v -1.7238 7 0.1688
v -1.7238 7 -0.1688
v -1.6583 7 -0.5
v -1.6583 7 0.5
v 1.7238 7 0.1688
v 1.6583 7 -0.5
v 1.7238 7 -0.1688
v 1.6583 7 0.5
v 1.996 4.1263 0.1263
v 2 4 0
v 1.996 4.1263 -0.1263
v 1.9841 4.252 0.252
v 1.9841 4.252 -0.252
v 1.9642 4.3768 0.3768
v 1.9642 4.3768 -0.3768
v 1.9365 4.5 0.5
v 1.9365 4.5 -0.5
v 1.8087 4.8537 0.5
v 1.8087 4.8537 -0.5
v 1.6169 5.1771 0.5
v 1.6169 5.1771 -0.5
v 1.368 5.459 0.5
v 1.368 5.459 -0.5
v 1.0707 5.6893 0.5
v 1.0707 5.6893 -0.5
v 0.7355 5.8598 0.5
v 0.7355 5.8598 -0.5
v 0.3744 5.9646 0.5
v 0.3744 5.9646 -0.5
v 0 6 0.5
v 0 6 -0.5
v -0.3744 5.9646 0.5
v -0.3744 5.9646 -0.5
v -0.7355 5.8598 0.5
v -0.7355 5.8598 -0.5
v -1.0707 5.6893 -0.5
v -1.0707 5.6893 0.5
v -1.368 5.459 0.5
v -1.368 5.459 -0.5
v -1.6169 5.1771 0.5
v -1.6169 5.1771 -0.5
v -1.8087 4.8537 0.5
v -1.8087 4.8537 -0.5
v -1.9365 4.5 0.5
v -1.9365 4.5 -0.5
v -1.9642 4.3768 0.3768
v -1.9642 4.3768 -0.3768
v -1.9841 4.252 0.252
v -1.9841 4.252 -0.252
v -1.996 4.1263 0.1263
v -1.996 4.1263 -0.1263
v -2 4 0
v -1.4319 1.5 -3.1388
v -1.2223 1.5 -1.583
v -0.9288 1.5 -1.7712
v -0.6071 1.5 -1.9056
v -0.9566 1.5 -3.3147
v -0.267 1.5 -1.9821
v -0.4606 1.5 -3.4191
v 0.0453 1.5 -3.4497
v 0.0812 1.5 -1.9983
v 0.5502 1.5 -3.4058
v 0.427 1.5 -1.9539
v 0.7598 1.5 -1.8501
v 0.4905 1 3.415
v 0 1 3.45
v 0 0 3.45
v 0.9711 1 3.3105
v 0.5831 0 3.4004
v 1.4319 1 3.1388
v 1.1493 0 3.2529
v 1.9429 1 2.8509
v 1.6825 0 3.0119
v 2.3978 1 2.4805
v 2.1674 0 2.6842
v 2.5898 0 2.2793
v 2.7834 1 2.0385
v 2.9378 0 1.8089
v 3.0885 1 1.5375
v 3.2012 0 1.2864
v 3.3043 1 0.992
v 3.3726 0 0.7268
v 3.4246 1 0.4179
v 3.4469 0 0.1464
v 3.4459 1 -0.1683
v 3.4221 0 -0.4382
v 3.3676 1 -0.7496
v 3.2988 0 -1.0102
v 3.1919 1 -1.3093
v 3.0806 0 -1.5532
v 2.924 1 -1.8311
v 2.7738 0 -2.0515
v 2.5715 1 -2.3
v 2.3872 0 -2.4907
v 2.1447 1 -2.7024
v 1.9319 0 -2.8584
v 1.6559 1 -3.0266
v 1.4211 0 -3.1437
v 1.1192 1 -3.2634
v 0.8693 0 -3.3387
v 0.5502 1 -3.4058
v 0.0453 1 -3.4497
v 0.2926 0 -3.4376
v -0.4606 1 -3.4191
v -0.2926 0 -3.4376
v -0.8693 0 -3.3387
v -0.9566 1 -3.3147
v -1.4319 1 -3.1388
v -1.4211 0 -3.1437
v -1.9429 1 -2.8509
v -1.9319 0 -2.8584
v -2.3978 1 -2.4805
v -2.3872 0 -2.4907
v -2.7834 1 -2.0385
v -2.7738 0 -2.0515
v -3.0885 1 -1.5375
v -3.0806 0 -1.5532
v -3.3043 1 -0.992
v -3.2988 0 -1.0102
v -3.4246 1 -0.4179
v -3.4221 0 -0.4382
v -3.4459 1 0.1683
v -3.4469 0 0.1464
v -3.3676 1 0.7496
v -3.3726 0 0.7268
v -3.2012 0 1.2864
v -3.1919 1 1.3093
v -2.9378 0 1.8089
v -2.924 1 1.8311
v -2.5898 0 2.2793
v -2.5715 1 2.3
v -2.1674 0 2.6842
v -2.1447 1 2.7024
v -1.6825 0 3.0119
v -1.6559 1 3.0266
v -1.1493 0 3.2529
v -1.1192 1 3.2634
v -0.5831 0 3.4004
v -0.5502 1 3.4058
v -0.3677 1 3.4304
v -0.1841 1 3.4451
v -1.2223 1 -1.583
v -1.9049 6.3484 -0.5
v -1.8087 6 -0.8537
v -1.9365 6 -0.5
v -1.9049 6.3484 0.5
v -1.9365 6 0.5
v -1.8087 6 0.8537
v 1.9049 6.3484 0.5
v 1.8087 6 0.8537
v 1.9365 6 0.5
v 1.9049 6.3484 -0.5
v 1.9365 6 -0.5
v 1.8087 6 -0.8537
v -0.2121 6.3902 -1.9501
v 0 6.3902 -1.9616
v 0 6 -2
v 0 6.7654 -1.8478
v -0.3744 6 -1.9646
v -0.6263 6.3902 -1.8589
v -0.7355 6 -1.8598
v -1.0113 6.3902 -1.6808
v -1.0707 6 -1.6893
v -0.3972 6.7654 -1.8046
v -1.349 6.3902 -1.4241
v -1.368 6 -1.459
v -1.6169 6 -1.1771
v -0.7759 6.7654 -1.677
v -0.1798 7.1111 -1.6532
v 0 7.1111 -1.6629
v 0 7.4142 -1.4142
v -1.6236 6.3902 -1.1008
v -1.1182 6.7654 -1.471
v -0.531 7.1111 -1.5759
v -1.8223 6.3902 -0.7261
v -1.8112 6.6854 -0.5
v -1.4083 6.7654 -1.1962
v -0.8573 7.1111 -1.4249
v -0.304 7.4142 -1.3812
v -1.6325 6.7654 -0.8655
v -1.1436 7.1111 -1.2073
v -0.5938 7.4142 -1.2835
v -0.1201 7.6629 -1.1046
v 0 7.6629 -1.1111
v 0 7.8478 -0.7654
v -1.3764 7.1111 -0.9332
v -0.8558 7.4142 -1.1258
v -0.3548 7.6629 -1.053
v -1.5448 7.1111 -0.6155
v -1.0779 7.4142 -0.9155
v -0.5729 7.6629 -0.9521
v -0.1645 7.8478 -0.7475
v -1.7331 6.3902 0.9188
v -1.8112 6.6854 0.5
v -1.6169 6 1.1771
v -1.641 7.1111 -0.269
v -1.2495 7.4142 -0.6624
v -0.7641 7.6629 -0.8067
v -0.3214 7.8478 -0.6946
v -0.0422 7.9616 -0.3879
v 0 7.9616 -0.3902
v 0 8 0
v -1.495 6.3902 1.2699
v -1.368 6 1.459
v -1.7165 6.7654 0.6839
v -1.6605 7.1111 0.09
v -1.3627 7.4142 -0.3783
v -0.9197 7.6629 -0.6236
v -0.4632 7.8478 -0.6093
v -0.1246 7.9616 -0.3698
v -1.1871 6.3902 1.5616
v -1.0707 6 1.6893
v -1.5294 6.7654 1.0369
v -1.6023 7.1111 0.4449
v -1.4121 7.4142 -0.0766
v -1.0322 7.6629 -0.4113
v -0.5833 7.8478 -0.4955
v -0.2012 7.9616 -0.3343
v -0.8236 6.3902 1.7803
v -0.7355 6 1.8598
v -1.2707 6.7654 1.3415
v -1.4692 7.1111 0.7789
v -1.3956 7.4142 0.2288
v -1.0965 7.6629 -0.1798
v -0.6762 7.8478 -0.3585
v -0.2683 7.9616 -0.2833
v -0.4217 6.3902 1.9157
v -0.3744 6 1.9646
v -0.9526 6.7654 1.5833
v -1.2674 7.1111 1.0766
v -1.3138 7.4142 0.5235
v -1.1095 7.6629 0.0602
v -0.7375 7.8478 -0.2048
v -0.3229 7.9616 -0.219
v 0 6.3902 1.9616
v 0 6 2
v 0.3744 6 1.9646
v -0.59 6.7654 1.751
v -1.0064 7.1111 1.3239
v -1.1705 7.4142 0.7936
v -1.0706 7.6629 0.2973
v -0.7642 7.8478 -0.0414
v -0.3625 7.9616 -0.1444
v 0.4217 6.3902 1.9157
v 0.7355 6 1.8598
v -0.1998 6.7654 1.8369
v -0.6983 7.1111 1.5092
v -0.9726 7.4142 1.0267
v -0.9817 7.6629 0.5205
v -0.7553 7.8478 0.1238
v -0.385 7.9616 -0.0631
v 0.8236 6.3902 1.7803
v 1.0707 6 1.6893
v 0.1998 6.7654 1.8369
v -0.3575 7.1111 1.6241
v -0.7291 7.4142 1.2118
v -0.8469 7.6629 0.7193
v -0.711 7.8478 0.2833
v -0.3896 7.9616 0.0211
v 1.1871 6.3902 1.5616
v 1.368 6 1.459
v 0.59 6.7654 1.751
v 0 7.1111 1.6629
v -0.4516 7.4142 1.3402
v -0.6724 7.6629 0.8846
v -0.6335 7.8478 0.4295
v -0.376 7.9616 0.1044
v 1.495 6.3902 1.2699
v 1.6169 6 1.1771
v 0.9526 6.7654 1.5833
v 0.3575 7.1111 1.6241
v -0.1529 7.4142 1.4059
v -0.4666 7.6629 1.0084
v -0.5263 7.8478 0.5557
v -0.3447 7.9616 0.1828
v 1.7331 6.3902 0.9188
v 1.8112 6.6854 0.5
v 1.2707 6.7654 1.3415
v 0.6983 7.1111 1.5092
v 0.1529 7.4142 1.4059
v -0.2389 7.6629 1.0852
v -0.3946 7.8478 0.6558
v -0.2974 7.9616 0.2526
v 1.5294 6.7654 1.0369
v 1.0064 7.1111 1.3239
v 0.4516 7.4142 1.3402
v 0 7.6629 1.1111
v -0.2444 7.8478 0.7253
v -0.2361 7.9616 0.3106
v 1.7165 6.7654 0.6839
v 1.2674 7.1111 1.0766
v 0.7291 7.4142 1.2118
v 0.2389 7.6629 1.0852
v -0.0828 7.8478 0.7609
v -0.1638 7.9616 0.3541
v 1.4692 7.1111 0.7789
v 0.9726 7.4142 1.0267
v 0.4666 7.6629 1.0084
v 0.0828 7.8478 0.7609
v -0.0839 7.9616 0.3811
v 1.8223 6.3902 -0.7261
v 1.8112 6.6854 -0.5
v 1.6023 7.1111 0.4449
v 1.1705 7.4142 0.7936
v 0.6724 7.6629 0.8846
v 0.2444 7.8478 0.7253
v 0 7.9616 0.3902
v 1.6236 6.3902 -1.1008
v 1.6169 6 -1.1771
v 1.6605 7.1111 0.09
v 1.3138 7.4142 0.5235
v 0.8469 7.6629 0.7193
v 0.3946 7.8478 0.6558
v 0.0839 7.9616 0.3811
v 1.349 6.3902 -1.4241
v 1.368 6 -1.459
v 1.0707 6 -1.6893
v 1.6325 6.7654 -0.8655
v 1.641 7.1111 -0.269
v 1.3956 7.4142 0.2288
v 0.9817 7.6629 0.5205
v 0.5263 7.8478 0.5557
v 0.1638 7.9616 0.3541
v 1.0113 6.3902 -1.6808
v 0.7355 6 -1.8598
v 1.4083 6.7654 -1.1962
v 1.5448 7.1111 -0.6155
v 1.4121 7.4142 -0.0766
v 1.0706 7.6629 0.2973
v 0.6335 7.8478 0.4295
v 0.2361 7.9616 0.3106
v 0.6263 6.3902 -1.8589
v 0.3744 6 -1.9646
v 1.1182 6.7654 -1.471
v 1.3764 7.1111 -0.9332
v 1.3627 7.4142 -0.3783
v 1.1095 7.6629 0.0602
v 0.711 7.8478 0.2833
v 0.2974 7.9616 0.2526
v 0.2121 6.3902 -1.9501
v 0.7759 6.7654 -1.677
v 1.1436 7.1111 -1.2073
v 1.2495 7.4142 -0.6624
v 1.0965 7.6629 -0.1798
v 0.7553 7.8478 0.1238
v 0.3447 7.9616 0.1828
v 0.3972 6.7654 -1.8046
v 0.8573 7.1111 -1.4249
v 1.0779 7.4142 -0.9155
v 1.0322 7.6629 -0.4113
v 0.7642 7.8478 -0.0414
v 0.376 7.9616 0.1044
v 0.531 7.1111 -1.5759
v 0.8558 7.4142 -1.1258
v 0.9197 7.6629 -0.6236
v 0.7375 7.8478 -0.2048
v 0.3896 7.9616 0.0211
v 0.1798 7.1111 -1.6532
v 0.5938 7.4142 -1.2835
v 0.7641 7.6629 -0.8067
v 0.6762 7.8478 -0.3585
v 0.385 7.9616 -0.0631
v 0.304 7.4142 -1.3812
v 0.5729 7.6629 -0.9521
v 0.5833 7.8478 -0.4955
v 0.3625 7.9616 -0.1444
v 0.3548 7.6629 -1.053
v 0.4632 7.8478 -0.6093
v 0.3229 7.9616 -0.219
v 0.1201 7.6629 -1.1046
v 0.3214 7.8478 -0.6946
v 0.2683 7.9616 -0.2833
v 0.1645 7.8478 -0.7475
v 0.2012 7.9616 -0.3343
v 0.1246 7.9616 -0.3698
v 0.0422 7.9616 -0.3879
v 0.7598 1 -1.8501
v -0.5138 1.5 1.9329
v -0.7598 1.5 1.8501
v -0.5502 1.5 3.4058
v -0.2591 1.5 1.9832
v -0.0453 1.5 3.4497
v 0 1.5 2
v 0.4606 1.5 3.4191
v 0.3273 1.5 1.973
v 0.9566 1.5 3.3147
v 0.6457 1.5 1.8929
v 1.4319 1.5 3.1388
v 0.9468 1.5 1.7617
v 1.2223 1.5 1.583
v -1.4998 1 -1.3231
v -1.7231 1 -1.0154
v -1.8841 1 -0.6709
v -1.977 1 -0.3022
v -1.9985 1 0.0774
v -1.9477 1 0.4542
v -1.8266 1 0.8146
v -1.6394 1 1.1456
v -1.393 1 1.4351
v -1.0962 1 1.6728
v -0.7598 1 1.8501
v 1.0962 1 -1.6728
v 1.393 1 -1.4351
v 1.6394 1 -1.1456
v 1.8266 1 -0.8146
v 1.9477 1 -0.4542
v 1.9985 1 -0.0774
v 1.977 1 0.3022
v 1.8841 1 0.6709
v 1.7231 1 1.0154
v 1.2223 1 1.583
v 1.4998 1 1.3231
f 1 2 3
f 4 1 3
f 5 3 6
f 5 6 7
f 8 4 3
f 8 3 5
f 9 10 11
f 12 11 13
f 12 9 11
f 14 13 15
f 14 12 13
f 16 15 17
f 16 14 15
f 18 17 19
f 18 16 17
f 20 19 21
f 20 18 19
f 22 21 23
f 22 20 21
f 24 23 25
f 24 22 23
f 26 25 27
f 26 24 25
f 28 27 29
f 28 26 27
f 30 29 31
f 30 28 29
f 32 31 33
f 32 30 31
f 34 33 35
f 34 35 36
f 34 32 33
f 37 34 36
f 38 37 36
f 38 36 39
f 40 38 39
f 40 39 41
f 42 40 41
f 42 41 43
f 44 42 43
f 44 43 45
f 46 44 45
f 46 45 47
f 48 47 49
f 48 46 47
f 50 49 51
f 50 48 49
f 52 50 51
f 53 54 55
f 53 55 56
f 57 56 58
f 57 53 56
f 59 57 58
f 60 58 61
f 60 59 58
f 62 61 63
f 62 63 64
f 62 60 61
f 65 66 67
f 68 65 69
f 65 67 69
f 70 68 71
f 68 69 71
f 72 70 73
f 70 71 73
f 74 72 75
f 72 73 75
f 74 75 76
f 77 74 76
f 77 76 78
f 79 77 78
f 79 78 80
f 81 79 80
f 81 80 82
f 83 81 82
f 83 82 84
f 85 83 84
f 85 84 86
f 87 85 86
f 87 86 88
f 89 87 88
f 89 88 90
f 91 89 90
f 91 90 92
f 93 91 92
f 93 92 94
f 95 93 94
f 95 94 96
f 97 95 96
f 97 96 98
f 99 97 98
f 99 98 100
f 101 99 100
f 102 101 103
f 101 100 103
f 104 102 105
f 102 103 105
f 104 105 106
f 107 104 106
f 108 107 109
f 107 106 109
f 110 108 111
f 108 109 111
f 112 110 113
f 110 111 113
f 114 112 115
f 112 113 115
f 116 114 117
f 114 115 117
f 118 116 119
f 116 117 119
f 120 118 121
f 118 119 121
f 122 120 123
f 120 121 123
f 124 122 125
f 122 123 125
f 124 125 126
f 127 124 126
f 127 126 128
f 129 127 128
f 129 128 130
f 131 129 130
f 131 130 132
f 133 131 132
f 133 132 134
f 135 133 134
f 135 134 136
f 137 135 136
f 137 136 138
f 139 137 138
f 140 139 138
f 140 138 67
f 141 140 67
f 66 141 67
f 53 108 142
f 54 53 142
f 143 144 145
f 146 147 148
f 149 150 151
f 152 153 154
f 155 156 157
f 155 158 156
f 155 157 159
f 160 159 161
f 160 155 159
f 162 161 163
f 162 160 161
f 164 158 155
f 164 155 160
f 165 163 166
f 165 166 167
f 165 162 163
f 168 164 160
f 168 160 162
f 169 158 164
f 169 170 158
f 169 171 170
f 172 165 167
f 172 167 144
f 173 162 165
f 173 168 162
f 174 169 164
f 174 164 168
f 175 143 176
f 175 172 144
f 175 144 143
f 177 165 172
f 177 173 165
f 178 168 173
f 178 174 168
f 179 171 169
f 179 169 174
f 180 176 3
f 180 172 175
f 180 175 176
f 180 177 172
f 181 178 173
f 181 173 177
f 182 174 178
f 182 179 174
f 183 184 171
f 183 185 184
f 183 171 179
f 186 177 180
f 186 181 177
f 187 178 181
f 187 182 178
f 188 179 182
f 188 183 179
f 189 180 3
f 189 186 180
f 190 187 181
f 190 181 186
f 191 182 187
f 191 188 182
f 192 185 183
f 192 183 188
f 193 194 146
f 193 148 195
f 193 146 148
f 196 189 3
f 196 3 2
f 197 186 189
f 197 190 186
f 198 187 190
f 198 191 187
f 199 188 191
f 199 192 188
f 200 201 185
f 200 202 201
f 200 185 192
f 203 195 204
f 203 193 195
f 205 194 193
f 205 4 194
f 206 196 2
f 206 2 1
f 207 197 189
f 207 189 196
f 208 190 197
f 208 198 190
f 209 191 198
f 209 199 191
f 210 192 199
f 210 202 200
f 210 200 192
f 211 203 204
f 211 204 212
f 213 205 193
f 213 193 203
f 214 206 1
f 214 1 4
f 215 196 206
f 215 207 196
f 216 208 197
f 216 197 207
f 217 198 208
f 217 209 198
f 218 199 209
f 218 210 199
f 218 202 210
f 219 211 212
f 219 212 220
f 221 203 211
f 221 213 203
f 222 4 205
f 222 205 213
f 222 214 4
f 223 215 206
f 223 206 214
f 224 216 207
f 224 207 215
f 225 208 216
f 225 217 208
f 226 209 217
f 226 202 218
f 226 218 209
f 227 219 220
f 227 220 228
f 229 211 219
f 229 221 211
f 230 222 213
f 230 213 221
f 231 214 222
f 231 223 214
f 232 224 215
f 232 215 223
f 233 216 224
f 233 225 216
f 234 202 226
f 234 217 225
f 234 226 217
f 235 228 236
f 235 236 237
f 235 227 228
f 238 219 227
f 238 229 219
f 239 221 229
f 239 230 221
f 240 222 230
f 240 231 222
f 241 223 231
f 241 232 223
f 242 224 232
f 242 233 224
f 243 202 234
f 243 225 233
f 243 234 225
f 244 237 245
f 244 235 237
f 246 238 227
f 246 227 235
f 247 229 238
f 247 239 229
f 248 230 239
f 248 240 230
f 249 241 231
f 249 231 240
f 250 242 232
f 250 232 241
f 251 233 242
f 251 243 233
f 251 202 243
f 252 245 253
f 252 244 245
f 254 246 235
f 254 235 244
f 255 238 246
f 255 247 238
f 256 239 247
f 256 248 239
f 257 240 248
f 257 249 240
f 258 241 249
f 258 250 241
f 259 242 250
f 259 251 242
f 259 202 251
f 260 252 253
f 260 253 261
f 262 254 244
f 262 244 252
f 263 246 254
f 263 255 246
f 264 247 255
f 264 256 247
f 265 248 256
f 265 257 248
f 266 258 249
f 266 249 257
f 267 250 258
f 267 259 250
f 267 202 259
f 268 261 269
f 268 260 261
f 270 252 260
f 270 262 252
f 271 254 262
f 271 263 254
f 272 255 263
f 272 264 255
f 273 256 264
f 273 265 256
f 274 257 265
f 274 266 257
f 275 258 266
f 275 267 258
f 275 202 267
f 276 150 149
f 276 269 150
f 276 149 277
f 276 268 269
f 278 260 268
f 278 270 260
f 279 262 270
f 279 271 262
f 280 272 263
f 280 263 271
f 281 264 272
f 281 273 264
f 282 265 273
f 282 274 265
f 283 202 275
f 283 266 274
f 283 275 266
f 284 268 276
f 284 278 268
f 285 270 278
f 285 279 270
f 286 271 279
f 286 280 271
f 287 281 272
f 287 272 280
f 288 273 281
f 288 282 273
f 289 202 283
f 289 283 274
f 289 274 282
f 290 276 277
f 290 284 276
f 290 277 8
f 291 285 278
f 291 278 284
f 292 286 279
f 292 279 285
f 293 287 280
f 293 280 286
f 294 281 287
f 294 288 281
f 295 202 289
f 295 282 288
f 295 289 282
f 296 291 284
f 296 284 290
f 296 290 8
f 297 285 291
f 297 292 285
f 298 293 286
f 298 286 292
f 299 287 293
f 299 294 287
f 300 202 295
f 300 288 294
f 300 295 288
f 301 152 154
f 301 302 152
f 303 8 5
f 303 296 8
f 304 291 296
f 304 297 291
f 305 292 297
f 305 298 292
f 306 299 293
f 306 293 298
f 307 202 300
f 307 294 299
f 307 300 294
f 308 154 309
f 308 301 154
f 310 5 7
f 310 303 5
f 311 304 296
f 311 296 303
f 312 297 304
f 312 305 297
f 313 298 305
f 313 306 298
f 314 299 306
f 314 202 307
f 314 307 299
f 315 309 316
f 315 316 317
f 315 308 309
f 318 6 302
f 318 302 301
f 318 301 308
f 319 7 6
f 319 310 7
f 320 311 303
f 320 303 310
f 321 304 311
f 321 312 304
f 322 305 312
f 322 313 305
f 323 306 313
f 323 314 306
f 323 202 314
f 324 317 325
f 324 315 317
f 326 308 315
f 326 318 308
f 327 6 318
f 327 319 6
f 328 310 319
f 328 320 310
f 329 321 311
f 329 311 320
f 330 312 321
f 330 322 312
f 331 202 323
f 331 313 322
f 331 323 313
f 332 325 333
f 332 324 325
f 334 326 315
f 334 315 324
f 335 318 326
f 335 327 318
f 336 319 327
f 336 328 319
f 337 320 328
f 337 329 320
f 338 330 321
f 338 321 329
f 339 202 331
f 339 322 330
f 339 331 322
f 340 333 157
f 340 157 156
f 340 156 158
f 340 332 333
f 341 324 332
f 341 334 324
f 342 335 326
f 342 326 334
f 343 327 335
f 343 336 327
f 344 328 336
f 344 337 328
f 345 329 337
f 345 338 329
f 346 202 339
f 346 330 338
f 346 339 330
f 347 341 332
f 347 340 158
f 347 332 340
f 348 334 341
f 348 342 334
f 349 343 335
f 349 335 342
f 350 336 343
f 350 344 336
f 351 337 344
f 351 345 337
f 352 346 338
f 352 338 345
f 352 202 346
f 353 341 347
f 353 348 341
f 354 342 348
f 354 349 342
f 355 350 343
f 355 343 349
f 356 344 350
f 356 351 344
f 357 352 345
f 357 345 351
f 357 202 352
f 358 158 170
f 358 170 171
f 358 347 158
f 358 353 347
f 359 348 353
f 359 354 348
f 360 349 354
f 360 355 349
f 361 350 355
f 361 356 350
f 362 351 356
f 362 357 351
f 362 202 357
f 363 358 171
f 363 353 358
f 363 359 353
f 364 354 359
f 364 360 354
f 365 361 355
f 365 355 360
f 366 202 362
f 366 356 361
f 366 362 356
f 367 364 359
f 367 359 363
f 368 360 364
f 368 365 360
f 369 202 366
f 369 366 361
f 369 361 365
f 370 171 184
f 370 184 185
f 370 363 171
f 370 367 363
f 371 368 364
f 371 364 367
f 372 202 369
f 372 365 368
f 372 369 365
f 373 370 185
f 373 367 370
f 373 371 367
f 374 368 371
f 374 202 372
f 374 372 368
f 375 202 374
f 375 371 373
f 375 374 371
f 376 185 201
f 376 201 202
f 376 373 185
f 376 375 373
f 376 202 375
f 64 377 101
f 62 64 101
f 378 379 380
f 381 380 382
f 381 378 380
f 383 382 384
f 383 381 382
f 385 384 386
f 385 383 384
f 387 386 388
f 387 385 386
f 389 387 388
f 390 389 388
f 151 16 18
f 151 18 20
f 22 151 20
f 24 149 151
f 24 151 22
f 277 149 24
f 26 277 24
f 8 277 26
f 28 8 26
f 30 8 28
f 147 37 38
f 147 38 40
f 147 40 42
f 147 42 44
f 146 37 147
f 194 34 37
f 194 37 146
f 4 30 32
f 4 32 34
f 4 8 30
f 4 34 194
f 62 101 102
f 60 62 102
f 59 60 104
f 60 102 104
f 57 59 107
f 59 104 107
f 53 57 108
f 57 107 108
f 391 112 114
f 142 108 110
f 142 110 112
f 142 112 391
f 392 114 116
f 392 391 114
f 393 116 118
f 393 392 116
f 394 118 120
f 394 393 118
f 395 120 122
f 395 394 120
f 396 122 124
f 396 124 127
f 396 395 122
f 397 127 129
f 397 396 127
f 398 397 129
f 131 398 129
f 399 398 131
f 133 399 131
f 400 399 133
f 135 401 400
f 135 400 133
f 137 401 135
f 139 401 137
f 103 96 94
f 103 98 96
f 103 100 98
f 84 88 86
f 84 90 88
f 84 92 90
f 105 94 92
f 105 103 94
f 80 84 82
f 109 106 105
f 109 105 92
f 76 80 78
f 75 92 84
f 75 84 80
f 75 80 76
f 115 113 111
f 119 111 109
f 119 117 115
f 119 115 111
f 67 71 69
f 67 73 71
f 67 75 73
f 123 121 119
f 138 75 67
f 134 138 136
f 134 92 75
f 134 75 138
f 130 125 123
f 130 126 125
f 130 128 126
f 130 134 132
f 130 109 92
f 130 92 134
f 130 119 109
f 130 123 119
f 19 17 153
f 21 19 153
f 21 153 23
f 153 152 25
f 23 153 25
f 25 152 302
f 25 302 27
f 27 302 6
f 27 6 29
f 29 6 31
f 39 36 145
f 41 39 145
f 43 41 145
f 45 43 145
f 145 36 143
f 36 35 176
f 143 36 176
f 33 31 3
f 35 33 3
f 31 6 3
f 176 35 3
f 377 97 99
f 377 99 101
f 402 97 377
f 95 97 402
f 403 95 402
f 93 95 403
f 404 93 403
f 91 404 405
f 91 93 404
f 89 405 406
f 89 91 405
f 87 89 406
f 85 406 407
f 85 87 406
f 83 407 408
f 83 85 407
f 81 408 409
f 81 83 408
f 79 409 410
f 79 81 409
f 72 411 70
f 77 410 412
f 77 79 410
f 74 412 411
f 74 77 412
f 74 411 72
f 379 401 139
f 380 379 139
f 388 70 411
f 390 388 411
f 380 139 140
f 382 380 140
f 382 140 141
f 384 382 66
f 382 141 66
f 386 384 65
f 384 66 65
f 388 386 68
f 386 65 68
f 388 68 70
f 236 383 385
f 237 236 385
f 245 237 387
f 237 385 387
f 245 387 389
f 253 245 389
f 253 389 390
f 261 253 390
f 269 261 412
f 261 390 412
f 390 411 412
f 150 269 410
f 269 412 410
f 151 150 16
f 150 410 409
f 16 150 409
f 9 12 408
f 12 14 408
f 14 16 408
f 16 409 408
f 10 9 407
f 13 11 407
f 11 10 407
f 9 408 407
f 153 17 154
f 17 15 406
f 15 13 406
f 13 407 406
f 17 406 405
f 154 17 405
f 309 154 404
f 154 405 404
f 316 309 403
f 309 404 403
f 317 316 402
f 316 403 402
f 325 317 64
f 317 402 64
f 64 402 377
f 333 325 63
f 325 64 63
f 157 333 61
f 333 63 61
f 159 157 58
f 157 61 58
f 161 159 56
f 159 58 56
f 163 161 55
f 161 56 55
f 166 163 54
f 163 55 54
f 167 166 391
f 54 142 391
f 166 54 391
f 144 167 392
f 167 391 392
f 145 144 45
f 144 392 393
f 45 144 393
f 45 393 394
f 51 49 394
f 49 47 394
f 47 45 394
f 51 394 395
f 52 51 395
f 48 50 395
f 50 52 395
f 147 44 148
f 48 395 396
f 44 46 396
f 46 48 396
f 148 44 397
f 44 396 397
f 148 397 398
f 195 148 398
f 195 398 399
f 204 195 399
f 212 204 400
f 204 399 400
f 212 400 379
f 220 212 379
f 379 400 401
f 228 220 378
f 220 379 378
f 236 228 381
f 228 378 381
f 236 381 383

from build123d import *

# Parameters (mm, degrees)
SKETCH2_R           = 3.45
BOSS_EXTRUDE1_DEPTH = 1
SKETCH4_R           = 2
BOSS_EXTRUDE2_DEPTH = 5
CUT_EXTRUDE1_DEPTH  = 0.5
BOSS_EXTRUDE3_DEPTH = 0.5


with BuildPart() as part:
    # Sketch2 → Boss-Extrude1 (new body)
    with BuildSketch(Plane(origin=(0, 0, 0), x_dir=(1, 0, 0), z_dir=(0, 1, 0))):
        with Locations(Location((0, 0, 0), (0, 0, 270))):
            Circle(SKETCH2_R)
    extrude(amount=BOSS_EXTRUDE1_DEPTH)

    # Sketch4 → Boss-Extrude2 (add)
    with BuildSketch(Plane(origin=(0, 1, 0), x_dir=(1, 0, 0), z_dir=(0, 1, 0))):
        with Locations(Location((0, 0, 0), (0, 0, 270))):
            Circle(SKETCH4_R)
    extrude(amount=BOSS_EXTRUDE2_DEPTH)

    # Sketch5 → Revolve1 (revolve)
    with BuildSketch(Plane(origin=(0, 0, 0), x_dir=(0, 0, -1), z_dir=(1, 0, 0)), mode=Mode.PRIVATE) as revolve1_sk:
        with BuildLine():
            Line((0, 0), (-1, 0))
            Line((-1, 0), (-2, 6))
            ThreePointArc((-2, 6), (-1.414213562, 7.414213562), (0, 8))
            Line((0, 8), (0, 0))
        make_face()
    revolve(revolve1_sk.sketch.rotate(Axis((0, 0, 0), (0, 1, 0)), 180), axis=Axis((0, 0, 0), (0, 1, 0)))

    # Sketch8 → Cut-Extrude1 (cut, symmetric)
    with BuildSketch(Plane.XY):
        with BuildLine():
            Line((-2, 4), (-2, 7))
            Line((-2, 7), (2, 7))
            Line((2, 7), (2, 4))
            ThreePointArc((2, 4), (0, 6), (-2, 4))
        make_face()
    extrude(amount=CUT_EXTRUDE1_DEPTH, both=True, mode=Mode.SUBTRACT)

    # Sketch10 → Boss-Extrude3 (add)
    with BuildSketch(Plane(origin=(0, 1, 0), x_dir=(1, 0, 0), z_dir=(0, 1, 0))):
        with BuildLine():
            Line((-1.431879851, 3.138824635), (-0.55021537, -3.405842487))
            ThreePointArc((-0.55021537, -3.405842487), (0.460605794, -3.419114257), (1.431879851, -3.138824635))
            Line((1.431879851, -3.138824635), (0.55021537, 3.405842487))
            ThreePointArc((0.55021537, 3.405842487), (-0.460605794, 3.419114257), (-1.431879851, 3.138824635))
        make_face()
    extrude(amount=BOSS_EXTRUDE3_DEPTH)


solid = part.part
